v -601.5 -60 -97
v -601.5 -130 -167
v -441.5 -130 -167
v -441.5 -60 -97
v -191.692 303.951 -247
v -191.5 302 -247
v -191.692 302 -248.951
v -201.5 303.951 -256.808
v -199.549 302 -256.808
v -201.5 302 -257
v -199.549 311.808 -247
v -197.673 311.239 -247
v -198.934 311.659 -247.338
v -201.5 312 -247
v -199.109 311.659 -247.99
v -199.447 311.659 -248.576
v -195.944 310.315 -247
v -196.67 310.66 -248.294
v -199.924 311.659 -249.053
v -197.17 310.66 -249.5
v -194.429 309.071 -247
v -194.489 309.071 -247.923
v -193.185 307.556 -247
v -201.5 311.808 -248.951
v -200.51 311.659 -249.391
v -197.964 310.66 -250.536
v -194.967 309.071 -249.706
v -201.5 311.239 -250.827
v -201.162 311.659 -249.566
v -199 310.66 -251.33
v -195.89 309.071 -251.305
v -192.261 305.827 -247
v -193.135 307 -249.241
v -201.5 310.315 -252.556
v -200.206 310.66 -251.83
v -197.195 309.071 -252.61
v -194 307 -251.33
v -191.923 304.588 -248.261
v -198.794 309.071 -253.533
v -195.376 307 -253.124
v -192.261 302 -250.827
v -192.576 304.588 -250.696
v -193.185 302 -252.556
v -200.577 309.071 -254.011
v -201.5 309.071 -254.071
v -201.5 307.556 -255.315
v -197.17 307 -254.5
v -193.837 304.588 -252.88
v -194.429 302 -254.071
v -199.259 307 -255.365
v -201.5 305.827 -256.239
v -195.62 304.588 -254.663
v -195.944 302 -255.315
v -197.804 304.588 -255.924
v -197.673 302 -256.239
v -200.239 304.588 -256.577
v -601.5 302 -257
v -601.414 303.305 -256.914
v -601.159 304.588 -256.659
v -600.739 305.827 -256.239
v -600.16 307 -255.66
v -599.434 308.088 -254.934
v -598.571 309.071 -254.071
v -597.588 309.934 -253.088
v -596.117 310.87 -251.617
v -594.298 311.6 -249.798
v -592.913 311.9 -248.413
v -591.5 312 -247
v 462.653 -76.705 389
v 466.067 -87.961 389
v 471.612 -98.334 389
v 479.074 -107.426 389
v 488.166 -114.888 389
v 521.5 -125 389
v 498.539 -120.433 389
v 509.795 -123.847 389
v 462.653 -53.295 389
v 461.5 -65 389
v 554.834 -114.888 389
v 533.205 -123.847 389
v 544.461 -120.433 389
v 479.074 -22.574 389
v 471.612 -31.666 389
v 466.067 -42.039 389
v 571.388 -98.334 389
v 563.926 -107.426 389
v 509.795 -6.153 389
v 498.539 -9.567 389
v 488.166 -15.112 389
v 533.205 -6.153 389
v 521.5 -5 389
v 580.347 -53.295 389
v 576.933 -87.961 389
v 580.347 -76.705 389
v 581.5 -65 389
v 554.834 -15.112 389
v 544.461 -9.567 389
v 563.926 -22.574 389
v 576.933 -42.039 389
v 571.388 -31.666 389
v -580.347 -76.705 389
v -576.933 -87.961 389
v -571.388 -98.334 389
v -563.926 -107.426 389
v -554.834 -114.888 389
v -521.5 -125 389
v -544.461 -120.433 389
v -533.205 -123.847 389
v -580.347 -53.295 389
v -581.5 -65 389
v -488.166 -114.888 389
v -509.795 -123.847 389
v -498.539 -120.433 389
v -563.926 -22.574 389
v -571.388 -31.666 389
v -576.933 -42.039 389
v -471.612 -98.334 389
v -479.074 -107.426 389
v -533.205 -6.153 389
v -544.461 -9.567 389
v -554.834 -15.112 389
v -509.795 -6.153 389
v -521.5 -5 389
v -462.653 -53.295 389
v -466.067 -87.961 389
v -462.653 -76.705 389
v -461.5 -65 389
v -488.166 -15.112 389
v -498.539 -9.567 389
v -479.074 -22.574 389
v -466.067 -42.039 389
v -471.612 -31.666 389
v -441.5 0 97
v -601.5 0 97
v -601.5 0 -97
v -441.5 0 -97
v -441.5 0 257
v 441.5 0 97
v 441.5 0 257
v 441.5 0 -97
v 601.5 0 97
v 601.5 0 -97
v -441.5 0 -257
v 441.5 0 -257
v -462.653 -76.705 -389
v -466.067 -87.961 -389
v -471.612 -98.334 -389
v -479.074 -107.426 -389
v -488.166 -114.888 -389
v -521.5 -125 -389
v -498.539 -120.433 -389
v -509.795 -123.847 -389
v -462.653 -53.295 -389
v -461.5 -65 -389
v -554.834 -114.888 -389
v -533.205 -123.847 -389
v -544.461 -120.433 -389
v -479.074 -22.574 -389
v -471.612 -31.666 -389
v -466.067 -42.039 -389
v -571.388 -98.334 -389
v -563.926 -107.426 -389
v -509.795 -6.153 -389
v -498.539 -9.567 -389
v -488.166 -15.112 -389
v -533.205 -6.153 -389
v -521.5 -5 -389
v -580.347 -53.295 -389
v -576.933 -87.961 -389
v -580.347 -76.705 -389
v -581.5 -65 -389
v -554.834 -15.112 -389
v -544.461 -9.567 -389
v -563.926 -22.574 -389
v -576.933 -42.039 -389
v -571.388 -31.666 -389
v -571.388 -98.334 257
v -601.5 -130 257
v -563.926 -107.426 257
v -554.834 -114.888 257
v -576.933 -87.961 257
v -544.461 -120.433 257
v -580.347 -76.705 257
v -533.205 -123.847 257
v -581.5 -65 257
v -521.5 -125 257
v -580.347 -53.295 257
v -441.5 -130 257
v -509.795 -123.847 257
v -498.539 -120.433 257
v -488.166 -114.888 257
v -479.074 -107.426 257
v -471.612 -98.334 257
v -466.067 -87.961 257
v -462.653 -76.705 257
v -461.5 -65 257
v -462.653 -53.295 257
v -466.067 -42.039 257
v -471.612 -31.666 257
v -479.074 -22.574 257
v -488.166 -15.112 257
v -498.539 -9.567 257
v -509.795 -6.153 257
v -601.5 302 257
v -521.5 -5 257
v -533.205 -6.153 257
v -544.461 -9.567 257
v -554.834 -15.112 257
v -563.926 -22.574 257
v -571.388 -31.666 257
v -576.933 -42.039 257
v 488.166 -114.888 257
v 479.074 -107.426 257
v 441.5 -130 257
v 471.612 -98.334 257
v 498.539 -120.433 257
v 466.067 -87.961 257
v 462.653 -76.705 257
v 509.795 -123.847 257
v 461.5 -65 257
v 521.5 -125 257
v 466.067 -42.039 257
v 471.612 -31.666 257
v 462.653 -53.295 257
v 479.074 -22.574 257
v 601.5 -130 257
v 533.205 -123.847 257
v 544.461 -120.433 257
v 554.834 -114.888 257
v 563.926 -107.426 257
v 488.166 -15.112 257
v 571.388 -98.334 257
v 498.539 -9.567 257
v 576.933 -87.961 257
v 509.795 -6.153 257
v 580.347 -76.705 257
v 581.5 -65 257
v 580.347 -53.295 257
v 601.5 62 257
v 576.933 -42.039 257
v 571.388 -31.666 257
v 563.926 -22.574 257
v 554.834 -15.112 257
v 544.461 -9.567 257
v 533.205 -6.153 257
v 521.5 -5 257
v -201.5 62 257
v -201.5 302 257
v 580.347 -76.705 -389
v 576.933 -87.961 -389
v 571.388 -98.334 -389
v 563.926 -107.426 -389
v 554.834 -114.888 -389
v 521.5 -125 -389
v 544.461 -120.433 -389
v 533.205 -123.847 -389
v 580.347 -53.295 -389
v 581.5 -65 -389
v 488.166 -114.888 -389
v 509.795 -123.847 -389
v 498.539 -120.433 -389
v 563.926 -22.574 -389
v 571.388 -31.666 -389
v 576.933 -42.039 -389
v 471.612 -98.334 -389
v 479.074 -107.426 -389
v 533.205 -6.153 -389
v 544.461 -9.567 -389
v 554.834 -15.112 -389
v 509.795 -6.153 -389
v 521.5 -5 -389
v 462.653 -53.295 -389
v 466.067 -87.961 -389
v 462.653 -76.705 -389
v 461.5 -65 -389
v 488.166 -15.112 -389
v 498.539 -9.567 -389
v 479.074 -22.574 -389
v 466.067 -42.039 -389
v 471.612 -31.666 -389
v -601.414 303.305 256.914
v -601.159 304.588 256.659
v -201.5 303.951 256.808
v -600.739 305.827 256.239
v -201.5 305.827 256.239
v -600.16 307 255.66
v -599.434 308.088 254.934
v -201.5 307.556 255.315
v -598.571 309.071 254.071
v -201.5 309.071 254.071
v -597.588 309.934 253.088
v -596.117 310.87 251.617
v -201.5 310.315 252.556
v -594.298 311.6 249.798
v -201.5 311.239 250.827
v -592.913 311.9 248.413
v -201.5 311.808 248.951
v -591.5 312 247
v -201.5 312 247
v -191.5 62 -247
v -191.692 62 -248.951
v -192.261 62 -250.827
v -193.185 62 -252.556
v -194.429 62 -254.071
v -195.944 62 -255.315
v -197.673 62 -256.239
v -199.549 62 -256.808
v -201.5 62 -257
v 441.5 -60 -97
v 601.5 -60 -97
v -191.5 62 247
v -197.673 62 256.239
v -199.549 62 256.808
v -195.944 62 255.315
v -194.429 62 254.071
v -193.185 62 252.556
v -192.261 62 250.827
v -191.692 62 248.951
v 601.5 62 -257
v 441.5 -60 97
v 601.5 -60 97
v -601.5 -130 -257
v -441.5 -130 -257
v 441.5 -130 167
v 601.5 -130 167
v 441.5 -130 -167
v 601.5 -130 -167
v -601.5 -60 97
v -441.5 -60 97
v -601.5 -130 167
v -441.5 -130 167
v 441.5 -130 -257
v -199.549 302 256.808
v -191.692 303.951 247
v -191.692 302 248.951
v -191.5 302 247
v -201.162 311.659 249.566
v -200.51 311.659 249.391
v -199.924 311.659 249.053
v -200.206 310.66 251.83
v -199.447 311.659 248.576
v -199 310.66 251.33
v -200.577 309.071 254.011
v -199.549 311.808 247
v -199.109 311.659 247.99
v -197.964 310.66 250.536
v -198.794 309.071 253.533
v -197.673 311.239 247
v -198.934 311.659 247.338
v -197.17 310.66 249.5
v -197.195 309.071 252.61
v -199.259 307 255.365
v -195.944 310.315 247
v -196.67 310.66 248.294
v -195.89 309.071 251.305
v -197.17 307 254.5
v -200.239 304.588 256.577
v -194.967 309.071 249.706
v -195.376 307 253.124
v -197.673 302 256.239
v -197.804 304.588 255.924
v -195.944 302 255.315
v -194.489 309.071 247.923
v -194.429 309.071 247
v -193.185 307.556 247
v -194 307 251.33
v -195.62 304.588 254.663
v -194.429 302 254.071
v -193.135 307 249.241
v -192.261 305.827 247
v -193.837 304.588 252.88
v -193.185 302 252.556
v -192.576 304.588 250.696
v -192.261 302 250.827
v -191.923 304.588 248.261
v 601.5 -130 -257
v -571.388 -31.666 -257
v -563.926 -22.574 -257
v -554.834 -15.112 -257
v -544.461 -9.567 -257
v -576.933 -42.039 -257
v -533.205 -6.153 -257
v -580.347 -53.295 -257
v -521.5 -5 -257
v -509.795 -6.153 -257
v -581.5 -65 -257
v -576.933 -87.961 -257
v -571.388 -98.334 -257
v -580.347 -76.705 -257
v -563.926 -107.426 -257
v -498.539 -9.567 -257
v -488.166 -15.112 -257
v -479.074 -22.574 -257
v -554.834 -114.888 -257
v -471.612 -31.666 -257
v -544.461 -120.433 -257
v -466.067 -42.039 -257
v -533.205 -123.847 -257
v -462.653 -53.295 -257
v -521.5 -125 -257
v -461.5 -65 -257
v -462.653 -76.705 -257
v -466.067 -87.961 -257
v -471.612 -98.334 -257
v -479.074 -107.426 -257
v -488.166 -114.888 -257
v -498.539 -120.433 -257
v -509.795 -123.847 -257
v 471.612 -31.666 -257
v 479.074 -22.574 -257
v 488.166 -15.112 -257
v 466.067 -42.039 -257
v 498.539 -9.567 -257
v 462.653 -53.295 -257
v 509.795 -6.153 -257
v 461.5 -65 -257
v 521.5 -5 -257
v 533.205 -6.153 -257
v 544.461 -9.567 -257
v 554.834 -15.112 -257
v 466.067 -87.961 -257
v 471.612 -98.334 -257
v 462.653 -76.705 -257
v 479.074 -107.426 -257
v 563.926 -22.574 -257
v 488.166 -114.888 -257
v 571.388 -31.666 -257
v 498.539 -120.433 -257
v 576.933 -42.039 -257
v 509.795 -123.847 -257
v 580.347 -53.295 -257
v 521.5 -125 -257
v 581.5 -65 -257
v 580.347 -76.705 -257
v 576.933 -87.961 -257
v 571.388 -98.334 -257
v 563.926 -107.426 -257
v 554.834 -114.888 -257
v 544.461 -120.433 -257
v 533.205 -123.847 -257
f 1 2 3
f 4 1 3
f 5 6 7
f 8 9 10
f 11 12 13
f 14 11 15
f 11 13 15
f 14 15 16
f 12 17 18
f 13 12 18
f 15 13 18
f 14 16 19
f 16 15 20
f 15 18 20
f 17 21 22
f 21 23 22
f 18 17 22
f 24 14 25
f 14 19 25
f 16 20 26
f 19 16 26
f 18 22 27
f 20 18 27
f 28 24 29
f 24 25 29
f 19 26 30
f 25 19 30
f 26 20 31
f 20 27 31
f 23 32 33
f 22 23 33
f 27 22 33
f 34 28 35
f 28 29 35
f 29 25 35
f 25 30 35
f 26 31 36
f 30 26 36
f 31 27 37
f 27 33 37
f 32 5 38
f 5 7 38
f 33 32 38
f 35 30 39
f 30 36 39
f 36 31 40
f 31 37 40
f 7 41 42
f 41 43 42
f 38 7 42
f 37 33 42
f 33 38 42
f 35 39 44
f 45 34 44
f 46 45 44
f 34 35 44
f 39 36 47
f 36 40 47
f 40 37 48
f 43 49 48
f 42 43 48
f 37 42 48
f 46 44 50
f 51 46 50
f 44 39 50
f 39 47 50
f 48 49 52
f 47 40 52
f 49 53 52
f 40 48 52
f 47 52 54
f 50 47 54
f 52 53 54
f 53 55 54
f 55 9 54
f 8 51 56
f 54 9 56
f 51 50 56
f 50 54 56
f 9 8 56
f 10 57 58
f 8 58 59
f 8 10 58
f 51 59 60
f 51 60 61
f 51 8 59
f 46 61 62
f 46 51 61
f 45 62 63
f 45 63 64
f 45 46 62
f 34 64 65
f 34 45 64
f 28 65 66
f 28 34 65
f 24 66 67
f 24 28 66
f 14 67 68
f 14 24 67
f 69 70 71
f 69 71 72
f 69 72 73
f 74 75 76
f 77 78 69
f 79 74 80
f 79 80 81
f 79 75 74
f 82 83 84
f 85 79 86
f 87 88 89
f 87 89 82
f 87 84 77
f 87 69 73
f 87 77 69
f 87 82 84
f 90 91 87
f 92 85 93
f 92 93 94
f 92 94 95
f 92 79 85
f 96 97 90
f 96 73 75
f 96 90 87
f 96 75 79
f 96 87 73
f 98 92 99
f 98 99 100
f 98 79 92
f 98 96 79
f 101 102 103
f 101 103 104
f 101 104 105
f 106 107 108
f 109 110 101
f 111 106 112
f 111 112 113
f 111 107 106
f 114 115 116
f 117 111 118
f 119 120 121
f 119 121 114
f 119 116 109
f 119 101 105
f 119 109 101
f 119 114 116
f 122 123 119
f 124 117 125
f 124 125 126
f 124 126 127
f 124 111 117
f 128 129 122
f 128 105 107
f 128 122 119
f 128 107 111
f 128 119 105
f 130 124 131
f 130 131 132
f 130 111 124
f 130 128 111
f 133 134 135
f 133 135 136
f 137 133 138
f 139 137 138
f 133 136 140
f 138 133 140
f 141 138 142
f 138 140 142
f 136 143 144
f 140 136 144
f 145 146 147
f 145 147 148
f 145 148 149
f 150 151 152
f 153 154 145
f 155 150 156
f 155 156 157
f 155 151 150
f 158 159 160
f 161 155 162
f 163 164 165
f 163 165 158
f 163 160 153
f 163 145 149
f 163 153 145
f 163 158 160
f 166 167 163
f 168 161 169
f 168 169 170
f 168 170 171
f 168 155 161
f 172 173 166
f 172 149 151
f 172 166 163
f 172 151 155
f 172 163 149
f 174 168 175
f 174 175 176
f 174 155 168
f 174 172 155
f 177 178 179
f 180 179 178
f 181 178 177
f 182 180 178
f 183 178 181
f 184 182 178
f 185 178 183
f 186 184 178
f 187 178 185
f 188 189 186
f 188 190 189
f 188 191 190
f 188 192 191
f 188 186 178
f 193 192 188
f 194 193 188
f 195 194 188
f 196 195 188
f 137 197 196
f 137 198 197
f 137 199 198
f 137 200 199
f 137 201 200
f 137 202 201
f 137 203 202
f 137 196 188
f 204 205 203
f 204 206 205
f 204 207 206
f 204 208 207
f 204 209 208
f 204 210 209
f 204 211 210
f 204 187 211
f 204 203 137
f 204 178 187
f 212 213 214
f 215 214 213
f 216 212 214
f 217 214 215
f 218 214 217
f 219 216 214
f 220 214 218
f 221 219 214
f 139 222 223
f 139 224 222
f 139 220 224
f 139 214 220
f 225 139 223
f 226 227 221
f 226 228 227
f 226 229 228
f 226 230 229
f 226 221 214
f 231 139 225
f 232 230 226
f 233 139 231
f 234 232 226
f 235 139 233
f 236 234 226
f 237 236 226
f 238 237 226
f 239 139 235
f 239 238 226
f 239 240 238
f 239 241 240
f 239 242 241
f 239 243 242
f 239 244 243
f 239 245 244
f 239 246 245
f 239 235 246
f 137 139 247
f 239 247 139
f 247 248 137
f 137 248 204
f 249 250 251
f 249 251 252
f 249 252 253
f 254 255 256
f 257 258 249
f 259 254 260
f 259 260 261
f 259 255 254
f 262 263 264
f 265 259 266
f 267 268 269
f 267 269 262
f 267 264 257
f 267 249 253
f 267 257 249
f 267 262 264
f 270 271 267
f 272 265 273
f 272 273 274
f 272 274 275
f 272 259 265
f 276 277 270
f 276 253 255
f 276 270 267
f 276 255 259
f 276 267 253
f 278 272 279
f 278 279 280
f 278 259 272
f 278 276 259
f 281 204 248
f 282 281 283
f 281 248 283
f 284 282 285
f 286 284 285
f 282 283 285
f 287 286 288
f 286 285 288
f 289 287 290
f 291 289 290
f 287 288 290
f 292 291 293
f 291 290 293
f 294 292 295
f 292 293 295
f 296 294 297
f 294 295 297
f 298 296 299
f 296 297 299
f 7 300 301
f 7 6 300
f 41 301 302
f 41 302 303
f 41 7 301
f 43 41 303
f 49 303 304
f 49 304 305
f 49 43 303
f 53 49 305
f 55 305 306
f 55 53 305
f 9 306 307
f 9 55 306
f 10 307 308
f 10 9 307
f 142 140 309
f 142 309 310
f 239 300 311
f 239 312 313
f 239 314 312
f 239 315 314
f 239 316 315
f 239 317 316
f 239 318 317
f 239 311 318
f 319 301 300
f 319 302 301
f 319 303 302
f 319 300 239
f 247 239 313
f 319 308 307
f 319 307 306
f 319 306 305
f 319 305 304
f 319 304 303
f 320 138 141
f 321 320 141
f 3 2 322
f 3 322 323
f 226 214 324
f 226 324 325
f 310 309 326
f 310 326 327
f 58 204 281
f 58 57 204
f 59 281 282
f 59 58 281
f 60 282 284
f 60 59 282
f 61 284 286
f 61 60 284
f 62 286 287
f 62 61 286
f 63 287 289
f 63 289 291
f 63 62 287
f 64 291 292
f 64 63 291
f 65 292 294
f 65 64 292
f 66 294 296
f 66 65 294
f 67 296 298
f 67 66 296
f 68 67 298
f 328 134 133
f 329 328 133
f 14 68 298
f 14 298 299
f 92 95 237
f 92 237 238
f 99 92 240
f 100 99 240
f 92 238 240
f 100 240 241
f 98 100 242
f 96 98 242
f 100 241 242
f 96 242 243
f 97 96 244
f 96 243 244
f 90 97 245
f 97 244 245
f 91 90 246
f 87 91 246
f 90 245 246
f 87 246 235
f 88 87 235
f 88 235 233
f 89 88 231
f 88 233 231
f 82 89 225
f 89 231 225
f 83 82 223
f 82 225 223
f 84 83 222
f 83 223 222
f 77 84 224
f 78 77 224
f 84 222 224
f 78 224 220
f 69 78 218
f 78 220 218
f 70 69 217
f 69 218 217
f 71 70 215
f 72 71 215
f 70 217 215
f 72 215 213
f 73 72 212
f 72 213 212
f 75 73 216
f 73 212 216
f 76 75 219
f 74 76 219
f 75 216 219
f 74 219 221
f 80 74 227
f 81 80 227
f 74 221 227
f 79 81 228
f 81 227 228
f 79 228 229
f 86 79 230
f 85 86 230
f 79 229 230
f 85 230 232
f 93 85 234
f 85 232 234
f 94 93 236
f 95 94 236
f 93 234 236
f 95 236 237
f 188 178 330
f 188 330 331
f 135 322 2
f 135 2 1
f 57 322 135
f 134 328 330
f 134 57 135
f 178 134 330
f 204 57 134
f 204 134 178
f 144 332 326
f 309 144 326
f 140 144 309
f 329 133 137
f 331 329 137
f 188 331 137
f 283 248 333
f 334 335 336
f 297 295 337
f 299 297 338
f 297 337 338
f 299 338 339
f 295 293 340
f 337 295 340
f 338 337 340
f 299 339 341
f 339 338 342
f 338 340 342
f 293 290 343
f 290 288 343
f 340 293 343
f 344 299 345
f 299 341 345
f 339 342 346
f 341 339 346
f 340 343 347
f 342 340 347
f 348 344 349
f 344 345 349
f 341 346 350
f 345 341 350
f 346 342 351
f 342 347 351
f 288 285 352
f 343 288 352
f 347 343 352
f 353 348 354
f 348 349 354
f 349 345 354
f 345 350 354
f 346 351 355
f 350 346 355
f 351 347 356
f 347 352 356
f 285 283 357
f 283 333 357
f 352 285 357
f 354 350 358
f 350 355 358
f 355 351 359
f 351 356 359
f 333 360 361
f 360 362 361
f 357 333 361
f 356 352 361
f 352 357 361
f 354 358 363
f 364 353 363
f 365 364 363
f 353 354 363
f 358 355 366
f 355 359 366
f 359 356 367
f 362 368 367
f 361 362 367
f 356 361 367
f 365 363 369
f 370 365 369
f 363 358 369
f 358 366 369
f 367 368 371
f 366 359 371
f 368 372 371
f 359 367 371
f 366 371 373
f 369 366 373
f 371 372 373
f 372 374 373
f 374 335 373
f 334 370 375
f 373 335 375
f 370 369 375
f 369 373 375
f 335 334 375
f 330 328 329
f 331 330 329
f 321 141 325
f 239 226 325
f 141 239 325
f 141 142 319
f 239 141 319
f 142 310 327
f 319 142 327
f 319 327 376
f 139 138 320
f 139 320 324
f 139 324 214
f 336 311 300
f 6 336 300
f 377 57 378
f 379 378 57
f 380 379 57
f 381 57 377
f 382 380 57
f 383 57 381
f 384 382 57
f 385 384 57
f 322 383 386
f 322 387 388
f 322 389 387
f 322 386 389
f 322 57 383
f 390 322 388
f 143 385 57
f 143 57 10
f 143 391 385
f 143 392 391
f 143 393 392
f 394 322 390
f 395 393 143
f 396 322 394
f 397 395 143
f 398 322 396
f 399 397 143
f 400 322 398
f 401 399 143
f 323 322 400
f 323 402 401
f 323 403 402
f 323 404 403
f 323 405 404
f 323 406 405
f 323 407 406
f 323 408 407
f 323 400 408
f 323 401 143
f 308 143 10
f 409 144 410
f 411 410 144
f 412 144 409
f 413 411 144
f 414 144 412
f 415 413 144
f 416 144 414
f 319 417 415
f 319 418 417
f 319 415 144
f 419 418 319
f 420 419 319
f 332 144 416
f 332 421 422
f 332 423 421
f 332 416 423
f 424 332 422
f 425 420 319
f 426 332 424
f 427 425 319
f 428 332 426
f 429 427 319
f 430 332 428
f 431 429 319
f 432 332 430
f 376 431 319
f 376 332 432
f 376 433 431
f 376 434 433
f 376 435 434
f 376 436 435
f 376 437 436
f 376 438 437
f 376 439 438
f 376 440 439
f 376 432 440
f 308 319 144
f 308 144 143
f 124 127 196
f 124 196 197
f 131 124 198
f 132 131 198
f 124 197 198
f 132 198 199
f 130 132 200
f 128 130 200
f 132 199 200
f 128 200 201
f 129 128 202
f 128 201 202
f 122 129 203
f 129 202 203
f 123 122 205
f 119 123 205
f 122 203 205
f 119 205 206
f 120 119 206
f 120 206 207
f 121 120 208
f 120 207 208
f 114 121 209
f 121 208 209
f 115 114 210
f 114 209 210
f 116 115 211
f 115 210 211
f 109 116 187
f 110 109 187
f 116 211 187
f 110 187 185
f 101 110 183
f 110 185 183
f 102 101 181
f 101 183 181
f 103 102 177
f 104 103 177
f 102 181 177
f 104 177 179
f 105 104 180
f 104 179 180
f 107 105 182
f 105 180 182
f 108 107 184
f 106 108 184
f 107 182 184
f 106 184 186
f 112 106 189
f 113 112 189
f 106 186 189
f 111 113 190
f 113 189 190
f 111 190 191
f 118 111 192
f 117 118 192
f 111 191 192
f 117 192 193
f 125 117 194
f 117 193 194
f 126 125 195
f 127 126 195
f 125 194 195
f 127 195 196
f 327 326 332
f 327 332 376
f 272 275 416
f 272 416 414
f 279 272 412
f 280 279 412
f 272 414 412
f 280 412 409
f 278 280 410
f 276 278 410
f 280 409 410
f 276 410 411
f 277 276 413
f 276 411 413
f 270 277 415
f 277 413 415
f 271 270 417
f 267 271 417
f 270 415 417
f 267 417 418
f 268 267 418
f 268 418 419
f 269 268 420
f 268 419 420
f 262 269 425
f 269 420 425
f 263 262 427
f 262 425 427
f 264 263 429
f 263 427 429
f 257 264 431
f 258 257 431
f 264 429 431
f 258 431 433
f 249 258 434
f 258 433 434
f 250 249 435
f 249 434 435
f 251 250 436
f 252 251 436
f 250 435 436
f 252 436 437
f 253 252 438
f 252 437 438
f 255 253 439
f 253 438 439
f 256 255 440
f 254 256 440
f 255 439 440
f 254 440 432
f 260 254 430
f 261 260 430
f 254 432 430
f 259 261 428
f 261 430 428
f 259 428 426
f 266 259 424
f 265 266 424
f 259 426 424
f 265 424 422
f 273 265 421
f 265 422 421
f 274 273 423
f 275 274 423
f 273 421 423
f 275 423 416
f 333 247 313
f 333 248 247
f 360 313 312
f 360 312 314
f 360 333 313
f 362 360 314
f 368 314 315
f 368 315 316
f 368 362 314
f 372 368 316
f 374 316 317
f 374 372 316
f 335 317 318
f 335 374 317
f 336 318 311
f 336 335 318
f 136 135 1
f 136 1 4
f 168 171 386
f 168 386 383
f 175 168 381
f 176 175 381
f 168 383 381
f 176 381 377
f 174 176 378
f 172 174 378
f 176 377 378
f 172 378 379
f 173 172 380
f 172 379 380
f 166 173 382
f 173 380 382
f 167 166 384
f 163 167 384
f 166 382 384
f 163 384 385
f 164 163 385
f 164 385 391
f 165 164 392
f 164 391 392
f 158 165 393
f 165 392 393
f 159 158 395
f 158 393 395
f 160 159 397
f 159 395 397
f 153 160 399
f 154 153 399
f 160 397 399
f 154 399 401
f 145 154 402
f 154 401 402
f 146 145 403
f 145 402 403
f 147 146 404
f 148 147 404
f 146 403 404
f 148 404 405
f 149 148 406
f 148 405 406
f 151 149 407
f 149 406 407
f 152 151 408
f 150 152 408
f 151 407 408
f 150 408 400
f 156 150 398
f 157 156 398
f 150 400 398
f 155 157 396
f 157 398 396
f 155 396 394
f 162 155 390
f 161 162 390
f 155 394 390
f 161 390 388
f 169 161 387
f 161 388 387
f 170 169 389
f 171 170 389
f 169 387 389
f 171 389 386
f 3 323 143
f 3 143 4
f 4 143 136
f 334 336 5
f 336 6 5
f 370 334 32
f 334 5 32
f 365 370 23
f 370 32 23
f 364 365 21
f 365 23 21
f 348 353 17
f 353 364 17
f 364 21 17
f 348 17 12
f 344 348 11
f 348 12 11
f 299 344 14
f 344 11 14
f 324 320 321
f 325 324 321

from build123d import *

# Parameters (mm, degrees)
SKETCH_1_W      = 1203
SKETCH_1_H      = 514
EXTRUDE_1_DEPTH = 62
SKETCH_2_W      = 410
SKETCH_2_H      = 514
EXTRUDE_2_DEPTH = 250
FILLET_1_R      = 10
SKETCH_3_W      = 160
SKETCH_3_H      = 160
EXTRUDE_3_DEPTH = 130
CHAMFER_1_SIZE  = 70
SKETCH_5_R      = 60
EXTRUDE_4_DEPTH = 132
SKETCH_4_R      = 60
EXTRUDE_5_DEPTH = 132


with BuildPart() as part:
    # Эскиз1 → Бобышка-Вытянуть1 (new body)
    with BuildSketch(Plane(origin=(0, 0, 0), x_dir=(1, 0, 0), z_dir=(0, 1, 0))):
        Rectangle(SKETCH_1_W, SKETCH_1_H)
    extrude(amount=EXTRUDE_1_DEPTH)

    # Эскиз2 → Бобышка-Вытянуть2 (add)
    with BuildSketch(Plane(origin=(0, 62, 0), x_dir=(1, 0, 0), z_dir=(0, 1, 0))):
        with Locations((-396.5, 0)):
            Rectangle(SKETCH_2_W, SKETCH_2_H)
    extrude(amount=EXTRUDE_2_DEPTH)

    # Скругление1
    fillet_1_edges = [part.edges().sort_by_distance(p)[0] for p in [
        (-191.5, 187, 257),
        (-191.5, 187, -257),
        (-601.5, 312, 0),
        (-396.5, 312, 257),
        (-191.5, 312, 0),
        (-396.5, 312, -257),
    ]]
    fillet(fillet_1_edges, radius=FILLET_1_R)

    # Эскиз3 → Бобышка-Вытянуть3 (add)
    with BuildSketch(Plane.XZ):
        with Locations((-521.5, 177)):
            Rectangle(SKETCH_3_W, SKETCH_3_H)
        with Locations((-521.5, -177)):
            Rectangle(SKETCH_3_W, SKETCH_3_H)
        with Locations((521.5, -177)):
            Rectangle(SKETCH_3_W, SKETCH_3_H)
        with Locations((521.5, 177)):
            Rectangle(SKETCH_3_W, SKETCH_3_H)
    extrude(amount=EXTRUDE_3_DEPTH)

    # Фаска1
    chamfer_1_edges = [part.edges().sort_by_distance(p)[0] for p in [
        (521.5, -130, 97),
        (-521.5, -130, 97),
        (-521.5, -130, -97),
        (521.5, -130, -97),
    ]]
    chamfer(chamfer_1_edges, length=CHAMFER_1_SIZE)

    # Эскиз5 → Бобышка-Вытянуть4 (add)
    with BuildSketch(Plane(origin=(0, 0, -257), x_dir=(-1, 0, 0), z_dir=(0, 0, -1))):
        with Locations((521.5, -65)):
            Circle(SKETCH_5_R)
        with Locations((-521.5, -65)):
            Circle(SKETCH_5_R)
    extrude(amount=EXTRUDE_4_DEPTH)

    # Эскиз4 → Бобышка-Вытянуть5 (add)
    with BuildSketch(Plane.XY.offset(257)):
        with Locations((-521.5, -65)):
            Circle(SKETCH_4_R)
        with Locations((521.5, -65)):
            Circle(SKETCH_4_R)
    extrude(amount=EXTRUDE_5_DEPTH)


solid = part.part
